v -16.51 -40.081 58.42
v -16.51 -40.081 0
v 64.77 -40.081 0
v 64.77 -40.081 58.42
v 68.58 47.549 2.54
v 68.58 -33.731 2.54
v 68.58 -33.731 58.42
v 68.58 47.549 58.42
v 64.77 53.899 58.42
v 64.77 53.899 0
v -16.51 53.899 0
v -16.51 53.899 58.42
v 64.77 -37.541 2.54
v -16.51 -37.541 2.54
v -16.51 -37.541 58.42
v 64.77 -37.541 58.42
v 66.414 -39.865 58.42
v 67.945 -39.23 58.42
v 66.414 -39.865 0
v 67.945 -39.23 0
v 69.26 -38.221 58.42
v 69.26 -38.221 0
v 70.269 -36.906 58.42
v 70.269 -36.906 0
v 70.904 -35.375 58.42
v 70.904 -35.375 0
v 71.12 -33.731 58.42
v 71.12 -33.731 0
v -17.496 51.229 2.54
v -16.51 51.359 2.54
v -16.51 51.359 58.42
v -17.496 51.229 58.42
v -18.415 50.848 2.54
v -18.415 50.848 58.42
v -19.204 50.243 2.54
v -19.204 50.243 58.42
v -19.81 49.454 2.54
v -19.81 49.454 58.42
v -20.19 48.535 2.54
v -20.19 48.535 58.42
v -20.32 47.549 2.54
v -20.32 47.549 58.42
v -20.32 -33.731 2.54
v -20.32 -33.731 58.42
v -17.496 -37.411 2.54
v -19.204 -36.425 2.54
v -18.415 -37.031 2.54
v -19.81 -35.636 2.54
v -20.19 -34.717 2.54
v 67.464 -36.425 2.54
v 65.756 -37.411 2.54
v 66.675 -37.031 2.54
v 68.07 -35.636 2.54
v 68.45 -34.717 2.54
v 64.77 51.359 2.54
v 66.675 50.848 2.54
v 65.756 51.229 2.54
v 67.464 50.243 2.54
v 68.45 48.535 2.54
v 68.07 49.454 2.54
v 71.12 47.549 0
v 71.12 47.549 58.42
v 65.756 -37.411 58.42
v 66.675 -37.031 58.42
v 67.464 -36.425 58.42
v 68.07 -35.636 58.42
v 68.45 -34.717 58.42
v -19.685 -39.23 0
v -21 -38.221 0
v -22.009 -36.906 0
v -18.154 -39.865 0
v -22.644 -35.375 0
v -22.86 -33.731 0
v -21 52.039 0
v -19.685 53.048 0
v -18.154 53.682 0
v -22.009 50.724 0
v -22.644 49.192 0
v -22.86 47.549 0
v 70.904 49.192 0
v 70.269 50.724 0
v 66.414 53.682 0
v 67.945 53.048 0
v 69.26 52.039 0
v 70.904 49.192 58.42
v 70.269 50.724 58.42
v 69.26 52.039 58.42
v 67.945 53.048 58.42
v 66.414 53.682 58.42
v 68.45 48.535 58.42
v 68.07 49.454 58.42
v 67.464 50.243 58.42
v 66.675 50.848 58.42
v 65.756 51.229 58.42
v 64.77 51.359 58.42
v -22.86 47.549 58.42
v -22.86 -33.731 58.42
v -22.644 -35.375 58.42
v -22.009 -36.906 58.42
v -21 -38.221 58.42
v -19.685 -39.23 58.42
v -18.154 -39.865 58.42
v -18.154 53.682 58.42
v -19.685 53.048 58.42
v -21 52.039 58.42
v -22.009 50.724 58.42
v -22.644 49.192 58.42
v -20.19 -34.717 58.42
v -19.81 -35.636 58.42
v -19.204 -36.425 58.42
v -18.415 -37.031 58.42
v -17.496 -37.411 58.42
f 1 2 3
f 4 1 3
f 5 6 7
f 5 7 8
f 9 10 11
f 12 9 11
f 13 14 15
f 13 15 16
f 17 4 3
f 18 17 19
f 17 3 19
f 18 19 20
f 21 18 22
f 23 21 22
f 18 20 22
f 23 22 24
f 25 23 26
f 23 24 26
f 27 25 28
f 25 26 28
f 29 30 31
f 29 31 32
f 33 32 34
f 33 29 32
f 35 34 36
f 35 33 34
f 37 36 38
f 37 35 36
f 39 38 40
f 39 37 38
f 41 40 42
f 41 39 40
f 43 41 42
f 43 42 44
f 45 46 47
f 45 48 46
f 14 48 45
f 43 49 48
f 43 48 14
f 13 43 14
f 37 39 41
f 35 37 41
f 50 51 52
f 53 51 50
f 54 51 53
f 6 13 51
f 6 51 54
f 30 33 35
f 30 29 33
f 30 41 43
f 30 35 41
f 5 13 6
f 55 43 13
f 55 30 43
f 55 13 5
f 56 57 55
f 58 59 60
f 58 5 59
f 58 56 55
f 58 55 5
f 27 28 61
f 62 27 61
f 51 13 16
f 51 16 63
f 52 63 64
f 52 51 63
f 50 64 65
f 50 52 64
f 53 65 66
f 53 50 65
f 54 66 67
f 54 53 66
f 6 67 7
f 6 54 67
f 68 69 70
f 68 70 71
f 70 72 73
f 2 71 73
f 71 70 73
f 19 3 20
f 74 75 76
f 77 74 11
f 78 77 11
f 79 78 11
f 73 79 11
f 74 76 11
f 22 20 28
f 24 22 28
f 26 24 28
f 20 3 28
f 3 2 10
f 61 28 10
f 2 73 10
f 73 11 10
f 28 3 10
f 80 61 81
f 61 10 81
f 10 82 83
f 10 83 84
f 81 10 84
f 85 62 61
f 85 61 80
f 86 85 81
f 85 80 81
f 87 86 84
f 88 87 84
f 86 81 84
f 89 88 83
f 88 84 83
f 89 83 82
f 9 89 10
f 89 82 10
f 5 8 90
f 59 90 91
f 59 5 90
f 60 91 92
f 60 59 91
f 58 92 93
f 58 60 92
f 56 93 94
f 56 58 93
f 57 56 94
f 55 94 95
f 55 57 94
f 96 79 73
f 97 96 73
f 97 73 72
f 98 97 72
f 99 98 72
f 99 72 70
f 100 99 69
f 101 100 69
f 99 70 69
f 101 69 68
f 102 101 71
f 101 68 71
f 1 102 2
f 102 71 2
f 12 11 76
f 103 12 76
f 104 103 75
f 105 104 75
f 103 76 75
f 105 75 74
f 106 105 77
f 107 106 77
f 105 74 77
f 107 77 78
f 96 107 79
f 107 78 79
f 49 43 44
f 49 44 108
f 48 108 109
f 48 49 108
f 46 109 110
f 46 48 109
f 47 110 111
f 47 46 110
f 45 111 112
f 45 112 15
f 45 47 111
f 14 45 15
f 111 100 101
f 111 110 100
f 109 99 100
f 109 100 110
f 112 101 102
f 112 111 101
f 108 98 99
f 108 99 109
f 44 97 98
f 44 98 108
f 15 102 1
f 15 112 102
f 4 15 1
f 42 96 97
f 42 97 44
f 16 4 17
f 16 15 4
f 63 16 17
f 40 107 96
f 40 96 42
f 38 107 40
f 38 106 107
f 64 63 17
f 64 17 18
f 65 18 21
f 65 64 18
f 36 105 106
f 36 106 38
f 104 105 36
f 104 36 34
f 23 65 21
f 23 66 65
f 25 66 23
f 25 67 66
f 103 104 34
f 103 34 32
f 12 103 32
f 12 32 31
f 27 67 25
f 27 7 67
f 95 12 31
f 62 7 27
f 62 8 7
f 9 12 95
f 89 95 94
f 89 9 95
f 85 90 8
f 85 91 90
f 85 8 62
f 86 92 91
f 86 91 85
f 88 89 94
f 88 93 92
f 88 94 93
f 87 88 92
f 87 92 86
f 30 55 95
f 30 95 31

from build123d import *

# Parameters (mm, degrees)
F1_DEPTH = 58.42
F2_T     = -2.54


with BuildPart() as f1:
    # F0 (on Top) → F1 (new body)
    with BuildSketch(Plane.XY):
        with BuildLine():
            Line((64.77, 53.898801), (-16.51, 53.898801))
            ThreePointArc((-16.51, 53.898801), (-21.000128, 52.038929), (-22.86, 47.548801))
            Line((-22.86, 47.548801), (-22.86, -33.731199))
            ThreePointArc((-22.86, -33.731199), (-21.000128, -38.221327), (-16.51, -40.081199))
            Line((-16.51, -40.081199), (64.77, -40.081199))
            ThreePointArc((64.77, -40.081199), (69.260128, -38.221327), (71.12, -33.731199))
            Line((71.12, -33.731199), (71.12, 47.548801))
            ThreePointArc((71.12, 47.548801), (69.260128, 52.038929), (64.77, 53.898801))
        make_face()
    extrude(amount=F1_DEPTH)

    # F2
    f2_openings = [f1.faces().sort_by_distance(p)[0] for p in [
        (24.13, 6.908801, 58.42),
    ]]
    offset(amount=F2_T, openings=f2_openings)


solid = f1.part
